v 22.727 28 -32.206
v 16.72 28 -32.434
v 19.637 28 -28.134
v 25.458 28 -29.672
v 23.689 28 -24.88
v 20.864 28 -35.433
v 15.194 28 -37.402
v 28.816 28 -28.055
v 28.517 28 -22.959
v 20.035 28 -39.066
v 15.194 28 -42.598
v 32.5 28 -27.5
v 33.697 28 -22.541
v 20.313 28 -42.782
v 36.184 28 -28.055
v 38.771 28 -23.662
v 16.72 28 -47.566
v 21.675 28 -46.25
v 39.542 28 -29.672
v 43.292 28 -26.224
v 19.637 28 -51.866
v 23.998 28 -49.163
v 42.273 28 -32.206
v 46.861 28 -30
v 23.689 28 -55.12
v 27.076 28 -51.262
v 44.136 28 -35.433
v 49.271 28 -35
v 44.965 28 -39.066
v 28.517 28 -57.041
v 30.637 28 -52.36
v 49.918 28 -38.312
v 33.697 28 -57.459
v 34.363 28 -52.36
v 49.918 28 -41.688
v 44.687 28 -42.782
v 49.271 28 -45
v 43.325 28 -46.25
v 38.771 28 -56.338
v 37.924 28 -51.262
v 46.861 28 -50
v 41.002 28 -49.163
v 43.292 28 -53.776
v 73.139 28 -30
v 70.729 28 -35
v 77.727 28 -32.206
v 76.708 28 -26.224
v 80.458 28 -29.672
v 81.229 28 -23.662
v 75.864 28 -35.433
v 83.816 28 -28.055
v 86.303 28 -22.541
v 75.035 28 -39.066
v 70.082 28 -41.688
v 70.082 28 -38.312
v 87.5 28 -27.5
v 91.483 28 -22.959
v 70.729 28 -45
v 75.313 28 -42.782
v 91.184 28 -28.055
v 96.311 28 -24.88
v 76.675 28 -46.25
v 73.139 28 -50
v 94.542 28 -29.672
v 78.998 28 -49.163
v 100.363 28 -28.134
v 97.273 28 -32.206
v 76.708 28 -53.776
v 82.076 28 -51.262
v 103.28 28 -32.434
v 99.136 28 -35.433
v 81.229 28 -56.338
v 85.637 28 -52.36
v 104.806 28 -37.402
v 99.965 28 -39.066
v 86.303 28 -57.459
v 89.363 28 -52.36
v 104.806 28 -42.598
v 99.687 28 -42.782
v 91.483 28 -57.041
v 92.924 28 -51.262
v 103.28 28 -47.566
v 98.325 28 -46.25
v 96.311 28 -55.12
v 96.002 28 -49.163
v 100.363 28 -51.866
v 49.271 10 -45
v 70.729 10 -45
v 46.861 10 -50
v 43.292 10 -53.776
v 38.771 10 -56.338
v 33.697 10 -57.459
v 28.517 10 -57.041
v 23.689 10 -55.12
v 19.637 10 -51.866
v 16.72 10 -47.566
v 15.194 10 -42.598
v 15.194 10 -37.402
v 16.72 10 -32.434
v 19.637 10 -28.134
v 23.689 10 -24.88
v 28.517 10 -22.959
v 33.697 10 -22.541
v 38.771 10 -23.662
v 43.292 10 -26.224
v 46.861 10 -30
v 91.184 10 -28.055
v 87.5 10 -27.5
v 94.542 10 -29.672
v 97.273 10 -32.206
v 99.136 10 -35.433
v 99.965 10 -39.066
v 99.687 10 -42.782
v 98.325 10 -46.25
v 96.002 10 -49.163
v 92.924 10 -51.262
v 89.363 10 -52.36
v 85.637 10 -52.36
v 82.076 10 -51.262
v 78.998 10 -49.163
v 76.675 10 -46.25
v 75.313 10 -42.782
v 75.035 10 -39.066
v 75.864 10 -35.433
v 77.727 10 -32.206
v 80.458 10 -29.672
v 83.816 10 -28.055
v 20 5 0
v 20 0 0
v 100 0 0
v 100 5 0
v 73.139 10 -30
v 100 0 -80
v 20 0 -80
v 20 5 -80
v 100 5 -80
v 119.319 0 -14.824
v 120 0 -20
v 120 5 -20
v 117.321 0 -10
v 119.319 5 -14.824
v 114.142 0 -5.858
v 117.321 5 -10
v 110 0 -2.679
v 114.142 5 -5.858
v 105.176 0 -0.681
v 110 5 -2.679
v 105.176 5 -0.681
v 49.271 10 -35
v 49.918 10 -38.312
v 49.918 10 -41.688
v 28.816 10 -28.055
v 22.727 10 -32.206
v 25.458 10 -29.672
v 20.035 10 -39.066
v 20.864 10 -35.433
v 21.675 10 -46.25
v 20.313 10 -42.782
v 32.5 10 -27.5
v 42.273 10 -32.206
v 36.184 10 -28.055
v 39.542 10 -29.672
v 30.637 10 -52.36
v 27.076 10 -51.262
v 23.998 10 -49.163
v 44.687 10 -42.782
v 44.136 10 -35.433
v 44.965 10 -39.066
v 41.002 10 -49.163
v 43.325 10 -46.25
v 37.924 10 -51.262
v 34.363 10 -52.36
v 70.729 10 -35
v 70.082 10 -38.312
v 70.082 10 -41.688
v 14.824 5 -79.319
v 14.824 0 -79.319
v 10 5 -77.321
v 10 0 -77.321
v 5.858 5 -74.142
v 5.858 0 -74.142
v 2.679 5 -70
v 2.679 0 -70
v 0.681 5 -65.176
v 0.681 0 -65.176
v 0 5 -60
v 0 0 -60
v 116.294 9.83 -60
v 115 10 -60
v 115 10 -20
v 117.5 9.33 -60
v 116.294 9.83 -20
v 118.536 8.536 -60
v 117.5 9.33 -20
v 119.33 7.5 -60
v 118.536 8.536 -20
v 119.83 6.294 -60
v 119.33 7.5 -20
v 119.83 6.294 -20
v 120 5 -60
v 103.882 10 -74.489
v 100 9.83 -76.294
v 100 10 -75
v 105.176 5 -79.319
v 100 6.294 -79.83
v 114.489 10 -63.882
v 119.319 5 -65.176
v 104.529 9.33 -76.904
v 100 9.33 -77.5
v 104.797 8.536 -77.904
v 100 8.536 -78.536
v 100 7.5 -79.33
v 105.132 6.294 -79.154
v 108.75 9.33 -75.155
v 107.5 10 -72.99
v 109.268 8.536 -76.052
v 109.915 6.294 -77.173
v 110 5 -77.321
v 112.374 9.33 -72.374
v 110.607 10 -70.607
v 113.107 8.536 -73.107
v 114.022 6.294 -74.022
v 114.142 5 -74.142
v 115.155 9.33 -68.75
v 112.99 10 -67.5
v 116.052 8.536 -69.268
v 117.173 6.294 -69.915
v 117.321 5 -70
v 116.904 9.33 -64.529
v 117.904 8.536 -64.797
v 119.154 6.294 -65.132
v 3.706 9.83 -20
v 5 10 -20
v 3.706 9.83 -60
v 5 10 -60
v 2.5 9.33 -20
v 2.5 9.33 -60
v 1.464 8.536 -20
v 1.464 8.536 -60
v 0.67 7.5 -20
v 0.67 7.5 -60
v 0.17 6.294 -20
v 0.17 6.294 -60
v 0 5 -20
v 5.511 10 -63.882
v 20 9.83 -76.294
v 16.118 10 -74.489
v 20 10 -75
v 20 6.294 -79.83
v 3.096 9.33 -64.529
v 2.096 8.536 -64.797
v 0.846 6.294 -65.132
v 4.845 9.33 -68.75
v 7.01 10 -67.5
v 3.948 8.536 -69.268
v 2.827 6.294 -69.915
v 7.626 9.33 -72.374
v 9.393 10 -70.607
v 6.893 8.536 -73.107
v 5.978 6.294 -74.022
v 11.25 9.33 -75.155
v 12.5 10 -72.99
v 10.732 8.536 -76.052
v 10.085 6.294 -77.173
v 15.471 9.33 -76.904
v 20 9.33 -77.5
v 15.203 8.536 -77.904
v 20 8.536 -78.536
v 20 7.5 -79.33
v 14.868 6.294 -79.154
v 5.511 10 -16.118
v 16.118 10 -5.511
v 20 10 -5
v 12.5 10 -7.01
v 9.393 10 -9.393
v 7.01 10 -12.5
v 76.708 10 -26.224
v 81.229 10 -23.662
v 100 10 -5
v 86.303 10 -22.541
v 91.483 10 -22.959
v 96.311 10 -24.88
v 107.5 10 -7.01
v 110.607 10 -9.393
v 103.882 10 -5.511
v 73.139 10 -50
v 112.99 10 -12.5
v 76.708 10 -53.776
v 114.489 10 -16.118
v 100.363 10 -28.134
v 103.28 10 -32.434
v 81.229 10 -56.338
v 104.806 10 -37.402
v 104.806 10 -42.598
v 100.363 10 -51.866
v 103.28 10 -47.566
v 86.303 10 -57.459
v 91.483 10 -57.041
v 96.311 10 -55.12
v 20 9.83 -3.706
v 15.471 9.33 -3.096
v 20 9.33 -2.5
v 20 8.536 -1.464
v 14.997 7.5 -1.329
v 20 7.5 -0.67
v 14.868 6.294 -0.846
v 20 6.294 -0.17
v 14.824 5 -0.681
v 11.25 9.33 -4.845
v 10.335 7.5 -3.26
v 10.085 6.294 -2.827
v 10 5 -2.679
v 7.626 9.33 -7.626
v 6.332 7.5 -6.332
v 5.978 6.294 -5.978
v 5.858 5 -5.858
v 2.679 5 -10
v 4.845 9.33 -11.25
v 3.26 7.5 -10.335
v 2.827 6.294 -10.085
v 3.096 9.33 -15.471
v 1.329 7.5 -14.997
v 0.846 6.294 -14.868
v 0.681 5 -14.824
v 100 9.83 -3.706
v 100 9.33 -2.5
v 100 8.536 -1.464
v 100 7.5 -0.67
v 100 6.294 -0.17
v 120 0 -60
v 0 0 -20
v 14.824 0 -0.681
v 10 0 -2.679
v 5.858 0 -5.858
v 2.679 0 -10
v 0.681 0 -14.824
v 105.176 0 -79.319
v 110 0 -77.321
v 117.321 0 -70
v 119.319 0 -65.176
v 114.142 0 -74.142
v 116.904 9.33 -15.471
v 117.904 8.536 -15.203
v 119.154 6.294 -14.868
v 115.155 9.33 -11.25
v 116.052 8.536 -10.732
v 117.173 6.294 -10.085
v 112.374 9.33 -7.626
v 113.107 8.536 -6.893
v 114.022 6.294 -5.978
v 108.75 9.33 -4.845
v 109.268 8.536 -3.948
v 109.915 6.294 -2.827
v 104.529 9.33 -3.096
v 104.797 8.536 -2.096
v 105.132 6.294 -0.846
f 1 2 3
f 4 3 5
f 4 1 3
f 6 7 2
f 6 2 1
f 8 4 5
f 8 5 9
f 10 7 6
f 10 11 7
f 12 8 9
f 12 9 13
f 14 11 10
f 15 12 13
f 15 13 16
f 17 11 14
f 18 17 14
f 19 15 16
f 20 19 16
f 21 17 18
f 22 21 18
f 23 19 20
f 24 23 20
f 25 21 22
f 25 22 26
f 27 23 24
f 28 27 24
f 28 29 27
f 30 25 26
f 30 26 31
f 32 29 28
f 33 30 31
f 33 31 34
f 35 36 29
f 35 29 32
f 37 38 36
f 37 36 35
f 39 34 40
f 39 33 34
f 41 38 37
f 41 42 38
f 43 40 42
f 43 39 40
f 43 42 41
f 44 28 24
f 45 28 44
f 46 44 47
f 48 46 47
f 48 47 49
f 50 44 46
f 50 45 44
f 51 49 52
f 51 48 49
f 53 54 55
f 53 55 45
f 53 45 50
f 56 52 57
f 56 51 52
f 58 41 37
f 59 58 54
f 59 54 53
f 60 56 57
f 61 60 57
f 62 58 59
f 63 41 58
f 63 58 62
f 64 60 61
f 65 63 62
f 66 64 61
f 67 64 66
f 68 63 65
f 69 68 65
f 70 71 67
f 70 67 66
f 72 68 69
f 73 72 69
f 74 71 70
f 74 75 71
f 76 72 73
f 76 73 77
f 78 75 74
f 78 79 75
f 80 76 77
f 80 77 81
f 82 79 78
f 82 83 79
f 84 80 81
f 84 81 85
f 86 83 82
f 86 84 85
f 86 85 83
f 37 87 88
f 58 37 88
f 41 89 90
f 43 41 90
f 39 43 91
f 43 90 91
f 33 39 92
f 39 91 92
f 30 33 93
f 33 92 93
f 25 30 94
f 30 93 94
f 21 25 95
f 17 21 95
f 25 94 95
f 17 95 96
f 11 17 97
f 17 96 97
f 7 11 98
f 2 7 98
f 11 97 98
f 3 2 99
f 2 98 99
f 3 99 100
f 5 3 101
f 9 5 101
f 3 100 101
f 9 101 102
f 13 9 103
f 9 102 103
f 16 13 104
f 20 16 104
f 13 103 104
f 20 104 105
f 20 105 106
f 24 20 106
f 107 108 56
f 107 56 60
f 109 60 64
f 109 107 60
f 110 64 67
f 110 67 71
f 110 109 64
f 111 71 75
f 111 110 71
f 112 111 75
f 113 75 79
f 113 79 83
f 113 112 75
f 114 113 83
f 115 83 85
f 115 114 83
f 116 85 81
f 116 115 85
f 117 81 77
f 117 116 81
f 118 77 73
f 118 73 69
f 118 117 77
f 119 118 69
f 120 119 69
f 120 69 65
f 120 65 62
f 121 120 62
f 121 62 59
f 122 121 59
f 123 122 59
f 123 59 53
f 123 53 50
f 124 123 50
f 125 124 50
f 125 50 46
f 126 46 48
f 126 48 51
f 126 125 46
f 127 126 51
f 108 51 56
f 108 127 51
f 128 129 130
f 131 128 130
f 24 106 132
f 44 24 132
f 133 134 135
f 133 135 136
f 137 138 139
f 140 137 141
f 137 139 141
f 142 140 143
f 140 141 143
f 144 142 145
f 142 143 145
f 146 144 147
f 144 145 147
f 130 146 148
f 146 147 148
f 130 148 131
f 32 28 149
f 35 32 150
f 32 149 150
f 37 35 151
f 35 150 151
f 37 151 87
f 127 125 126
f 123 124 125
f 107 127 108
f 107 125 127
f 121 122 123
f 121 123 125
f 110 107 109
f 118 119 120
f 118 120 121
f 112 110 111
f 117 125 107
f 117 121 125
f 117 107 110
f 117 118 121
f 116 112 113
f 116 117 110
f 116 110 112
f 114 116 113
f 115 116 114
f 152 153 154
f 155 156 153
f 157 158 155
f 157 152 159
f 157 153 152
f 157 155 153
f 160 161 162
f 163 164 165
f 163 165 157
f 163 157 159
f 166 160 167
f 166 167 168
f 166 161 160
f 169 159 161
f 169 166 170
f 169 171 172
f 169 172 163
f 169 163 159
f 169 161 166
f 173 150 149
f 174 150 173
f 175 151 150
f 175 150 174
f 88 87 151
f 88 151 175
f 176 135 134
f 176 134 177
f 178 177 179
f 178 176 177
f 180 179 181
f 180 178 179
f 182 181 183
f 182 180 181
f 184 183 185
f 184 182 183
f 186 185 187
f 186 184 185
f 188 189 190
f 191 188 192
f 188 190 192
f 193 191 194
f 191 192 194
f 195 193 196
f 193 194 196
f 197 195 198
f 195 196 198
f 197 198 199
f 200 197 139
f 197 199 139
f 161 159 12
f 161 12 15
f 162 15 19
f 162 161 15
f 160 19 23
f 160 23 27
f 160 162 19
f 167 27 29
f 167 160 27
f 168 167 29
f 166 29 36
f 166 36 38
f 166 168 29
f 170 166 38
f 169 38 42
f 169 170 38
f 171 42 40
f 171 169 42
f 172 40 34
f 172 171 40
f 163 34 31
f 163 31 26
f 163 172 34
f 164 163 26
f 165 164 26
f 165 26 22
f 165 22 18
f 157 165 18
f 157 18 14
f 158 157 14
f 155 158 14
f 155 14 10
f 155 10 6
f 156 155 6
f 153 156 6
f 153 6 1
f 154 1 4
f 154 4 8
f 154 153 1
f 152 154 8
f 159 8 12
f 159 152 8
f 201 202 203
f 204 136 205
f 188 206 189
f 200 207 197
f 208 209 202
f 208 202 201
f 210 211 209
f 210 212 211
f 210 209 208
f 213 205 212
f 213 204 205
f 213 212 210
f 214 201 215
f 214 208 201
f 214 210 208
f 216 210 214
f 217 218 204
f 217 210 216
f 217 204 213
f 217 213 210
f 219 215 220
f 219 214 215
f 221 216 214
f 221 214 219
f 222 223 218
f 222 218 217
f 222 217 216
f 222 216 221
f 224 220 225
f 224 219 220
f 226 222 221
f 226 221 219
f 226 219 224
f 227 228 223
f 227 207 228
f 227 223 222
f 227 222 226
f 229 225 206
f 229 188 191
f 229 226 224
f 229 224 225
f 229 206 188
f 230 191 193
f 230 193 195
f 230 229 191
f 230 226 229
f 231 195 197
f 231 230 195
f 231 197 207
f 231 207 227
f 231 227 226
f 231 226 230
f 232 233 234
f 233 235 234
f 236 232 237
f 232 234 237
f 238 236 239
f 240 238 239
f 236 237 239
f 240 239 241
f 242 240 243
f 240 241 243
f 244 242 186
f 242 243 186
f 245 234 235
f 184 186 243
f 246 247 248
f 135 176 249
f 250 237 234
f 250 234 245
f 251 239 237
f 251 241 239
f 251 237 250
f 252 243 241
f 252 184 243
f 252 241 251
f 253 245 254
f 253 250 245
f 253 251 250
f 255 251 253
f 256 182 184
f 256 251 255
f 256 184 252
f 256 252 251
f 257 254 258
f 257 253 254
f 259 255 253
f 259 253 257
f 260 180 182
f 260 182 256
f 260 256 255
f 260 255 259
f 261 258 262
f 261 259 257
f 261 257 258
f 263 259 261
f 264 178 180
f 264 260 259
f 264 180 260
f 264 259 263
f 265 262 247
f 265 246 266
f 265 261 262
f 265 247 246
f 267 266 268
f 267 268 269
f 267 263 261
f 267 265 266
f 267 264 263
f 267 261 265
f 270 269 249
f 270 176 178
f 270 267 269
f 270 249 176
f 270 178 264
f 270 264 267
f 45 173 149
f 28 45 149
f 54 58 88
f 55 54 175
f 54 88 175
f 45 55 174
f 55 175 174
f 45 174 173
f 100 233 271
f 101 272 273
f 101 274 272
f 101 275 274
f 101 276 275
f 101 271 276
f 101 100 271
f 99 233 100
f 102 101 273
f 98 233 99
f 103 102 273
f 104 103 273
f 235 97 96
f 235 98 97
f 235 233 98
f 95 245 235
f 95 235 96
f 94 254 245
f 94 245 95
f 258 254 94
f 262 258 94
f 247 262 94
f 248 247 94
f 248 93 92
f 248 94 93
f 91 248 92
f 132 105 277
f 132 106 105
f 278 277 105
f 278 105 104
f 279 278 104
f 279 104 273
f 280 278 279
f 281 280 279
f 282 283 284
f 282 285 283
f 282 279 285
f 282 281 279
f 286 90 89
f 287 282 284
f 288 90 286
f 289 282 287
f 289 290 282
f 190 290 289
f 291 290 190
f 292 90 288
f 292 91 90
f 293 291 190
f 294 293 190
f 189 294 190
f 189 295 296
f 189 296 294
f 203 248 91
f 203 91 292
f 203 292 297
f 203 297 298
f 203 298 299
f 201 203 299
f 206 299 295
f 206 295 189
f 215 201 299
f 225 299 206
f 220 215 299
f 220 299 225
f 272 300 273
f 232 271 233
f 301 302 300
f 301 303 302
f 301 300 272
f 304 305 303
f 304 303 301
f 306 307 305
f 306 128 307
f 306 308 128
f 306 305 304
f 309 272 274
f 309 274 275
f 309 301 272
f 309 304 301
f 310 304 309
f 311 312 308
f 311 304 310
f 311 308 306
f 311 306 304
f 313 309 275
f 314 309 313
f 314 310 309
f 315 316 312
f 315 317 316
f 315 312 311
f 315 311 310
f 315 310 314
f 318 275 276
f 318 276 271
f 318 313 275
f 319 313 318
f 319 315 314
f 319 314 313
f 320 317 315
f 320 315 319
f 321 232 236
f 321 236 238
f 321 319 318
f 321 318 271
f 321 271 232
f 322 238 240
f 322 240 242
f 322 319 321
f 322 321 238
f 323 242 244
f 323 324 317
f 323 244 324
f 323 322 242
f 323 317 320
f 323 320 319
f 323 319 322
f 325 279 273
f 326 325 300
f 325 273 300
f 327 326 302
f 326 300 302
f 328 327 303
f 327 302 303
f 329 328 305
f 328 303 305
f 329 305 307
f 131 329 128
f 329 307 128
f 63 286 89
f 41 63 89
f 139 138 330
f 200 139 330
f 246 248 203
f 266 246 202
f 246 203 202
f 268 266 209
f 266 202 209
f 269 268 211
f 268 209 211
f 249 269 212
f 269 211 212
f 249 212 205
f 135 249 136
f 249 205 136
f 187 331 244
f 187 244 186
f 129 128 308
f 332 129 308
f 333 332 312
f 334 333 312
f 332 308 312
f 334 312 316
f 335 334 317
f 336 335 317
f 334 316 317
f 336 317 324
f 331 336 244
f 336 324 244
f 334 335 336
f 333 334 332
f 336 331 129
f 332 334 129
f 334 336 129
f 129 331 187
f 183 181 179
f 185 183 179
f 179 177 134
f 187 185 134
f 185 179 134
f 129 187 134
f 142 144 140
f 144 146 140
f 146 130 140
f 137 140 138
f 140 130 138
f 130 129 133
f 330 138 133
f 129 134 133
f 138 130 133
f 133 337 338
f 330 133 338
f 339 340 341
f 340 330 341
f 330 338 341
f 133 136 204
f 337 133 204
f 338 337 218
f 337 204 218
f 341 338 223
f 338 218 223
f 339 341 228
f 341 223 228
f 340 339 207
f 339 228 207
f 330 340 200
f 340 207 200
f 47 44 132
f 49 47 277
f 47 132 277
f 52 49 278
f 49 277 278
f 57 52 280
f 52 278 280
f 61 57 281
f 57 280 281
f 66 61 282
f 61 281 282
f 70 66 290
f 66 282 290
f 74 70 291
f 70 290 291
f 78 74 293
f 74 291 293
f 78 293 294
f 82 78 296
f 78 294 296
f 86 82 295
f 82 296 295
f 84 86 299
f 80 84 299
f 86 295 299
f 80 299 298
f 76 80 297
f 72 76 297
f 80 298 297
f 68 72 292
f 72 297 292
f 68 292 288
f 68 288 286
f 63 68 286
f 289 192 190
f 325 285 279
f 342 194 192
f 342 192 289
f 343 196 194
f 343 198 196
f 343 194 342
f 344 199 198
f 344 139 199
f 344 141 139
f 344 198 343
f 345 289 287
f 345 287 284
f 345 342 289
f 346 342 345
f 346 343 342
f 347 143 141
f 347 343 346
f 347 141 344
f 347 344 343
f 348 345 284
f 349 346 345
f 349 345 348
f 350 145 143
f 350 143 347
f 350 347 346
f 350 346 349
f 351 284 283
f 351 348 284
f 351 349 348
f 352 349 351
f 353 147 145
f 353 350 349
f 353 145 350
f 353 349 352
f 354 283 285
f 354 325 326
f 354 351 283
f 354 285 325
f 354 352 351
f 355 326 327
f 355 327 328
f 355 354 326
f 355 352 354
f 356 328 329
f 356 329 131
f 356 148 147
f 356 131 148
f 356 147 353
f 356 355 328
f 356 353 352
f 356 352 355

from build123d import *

# Parameters (mm, degrees)
SKETCH1_W           = 120
SKETCH1_H           = 80
BOSS_EXTRUDE1_DEPTH = 10
SKETCH2_R           = 17.5
SKETCH2_R_2         = 12.5
BOSS_EXTRUDE2_DEPTH = 18
FILLET1_R           = 20
FILLET2_R           = 5


with BuildPart() as part:
    # Sketch1 → Boss-Extrude1 (new body)
    with BuildSketch(Plane(origin=(0, 0, 0), x_dir=(1, 0, 0), z_dir=(0, 1, 0))):
        with Locations((60, 40)):
            Rectangle(SKETCH1_W, SKETCH1_H)
    extrude(amount=BOSS_EXTRUDE1_DEPTH)

    # Sketch2 → Boss-Extrude2 (add)
    # profile 1 of 4: a face of its own
    with BuildSketch(Plane(origin=(0, 10, 0), x_dir=(1, 0, 0), z_dir=(0, 1, 0))):
        with BuildLine():
            Line((49.270509831, 45), (70.729490169, 45))
            ThreePointArc((70.729490169, 45), (71.734561363, 47.596113781), (73.138593384, 50))
            Line((73.138593384, 50), (46.861406616, 50))
            ThreePointArc((46.861406616, 50), (48.265438637, 47.596113781), (49.270509831, 45))
        make_face()
    # profile 2 of 4: a face of its own
    with BuildSketch(Plane(origin=(0, 10, 0), x_dir=(1, 0, 0), z_dir=(0, 1, 0))):
        with Locations((32.5, 40)):
            Circle(SKETCH2_R)
        with Locations(Location((32.5, 40, 0), (0, 0, 270))):
            Circle(SKETCH2_R_2, mode=Mode.SUBTRACT)
    # profile 3 of 4: a face of its own
    with BuildSketch(Plane(origin=(0, 10, 0), x_dir=(1, 0, 0), z_dir=(0, 1, 0))):
        with BuildLine():
            ThreePointArc((73.138593384, 30), (71.734561363, 32.403886219), (70.729490169, 35))
            Line((70.729490169, 35), (49.270509831, 35))
            ThreePointArc((49.270509831, 35), (48.265438637, 32.403886219), (46.861406616, 30))
            Line((46.861406616, 30), (73.138593384, 30))
        make_face()
    # profile 4 of 4: a face of its own
    with BuildSketch(Plane(origin=(0, 10, 0), x_dir=(1, 0, 0), z_dir=(0, 1, 0))):
        with Locations((87.5, 40)):
            Circle(SKETCH2_R)
        with Locations(Location((87.5, 40, 0), (0, 0, 270))):
            Circle(SKETCH2_R_2, mode=Mode.SUBTRACT)
    extrude(amount=BOSS_EXTRUDE2_DEPTH)

    # Fillet1
    fillet1_edges = [part.edges().sort_by_distance(p)[0] for p in [
        (0, 5, -80),
        (120, 5, -80),
        (120, 5, 0),
        (0, 5, 0),
    ]]
    fillet(fillet1_edges, radius=FILLET1_R)

    # Fillet2
    fillet2_edges = [part.edges().sort_by_distance(p)[0] for p in [
        (0, 10, -40),
        (60, 10, -80),
        (60, 10, 0),
        (120, 10, -40),
        (5.857864376, 10, -5.857864376),
        (114.142135624, 10, -5.857864376),
        (114.142135624, 10, -74.142135624),
        (5.857864376, 10, -74.142135624),
    ]]
    fillet(fillet2_edges, radius=FILLET2_R)


solid = part.part
